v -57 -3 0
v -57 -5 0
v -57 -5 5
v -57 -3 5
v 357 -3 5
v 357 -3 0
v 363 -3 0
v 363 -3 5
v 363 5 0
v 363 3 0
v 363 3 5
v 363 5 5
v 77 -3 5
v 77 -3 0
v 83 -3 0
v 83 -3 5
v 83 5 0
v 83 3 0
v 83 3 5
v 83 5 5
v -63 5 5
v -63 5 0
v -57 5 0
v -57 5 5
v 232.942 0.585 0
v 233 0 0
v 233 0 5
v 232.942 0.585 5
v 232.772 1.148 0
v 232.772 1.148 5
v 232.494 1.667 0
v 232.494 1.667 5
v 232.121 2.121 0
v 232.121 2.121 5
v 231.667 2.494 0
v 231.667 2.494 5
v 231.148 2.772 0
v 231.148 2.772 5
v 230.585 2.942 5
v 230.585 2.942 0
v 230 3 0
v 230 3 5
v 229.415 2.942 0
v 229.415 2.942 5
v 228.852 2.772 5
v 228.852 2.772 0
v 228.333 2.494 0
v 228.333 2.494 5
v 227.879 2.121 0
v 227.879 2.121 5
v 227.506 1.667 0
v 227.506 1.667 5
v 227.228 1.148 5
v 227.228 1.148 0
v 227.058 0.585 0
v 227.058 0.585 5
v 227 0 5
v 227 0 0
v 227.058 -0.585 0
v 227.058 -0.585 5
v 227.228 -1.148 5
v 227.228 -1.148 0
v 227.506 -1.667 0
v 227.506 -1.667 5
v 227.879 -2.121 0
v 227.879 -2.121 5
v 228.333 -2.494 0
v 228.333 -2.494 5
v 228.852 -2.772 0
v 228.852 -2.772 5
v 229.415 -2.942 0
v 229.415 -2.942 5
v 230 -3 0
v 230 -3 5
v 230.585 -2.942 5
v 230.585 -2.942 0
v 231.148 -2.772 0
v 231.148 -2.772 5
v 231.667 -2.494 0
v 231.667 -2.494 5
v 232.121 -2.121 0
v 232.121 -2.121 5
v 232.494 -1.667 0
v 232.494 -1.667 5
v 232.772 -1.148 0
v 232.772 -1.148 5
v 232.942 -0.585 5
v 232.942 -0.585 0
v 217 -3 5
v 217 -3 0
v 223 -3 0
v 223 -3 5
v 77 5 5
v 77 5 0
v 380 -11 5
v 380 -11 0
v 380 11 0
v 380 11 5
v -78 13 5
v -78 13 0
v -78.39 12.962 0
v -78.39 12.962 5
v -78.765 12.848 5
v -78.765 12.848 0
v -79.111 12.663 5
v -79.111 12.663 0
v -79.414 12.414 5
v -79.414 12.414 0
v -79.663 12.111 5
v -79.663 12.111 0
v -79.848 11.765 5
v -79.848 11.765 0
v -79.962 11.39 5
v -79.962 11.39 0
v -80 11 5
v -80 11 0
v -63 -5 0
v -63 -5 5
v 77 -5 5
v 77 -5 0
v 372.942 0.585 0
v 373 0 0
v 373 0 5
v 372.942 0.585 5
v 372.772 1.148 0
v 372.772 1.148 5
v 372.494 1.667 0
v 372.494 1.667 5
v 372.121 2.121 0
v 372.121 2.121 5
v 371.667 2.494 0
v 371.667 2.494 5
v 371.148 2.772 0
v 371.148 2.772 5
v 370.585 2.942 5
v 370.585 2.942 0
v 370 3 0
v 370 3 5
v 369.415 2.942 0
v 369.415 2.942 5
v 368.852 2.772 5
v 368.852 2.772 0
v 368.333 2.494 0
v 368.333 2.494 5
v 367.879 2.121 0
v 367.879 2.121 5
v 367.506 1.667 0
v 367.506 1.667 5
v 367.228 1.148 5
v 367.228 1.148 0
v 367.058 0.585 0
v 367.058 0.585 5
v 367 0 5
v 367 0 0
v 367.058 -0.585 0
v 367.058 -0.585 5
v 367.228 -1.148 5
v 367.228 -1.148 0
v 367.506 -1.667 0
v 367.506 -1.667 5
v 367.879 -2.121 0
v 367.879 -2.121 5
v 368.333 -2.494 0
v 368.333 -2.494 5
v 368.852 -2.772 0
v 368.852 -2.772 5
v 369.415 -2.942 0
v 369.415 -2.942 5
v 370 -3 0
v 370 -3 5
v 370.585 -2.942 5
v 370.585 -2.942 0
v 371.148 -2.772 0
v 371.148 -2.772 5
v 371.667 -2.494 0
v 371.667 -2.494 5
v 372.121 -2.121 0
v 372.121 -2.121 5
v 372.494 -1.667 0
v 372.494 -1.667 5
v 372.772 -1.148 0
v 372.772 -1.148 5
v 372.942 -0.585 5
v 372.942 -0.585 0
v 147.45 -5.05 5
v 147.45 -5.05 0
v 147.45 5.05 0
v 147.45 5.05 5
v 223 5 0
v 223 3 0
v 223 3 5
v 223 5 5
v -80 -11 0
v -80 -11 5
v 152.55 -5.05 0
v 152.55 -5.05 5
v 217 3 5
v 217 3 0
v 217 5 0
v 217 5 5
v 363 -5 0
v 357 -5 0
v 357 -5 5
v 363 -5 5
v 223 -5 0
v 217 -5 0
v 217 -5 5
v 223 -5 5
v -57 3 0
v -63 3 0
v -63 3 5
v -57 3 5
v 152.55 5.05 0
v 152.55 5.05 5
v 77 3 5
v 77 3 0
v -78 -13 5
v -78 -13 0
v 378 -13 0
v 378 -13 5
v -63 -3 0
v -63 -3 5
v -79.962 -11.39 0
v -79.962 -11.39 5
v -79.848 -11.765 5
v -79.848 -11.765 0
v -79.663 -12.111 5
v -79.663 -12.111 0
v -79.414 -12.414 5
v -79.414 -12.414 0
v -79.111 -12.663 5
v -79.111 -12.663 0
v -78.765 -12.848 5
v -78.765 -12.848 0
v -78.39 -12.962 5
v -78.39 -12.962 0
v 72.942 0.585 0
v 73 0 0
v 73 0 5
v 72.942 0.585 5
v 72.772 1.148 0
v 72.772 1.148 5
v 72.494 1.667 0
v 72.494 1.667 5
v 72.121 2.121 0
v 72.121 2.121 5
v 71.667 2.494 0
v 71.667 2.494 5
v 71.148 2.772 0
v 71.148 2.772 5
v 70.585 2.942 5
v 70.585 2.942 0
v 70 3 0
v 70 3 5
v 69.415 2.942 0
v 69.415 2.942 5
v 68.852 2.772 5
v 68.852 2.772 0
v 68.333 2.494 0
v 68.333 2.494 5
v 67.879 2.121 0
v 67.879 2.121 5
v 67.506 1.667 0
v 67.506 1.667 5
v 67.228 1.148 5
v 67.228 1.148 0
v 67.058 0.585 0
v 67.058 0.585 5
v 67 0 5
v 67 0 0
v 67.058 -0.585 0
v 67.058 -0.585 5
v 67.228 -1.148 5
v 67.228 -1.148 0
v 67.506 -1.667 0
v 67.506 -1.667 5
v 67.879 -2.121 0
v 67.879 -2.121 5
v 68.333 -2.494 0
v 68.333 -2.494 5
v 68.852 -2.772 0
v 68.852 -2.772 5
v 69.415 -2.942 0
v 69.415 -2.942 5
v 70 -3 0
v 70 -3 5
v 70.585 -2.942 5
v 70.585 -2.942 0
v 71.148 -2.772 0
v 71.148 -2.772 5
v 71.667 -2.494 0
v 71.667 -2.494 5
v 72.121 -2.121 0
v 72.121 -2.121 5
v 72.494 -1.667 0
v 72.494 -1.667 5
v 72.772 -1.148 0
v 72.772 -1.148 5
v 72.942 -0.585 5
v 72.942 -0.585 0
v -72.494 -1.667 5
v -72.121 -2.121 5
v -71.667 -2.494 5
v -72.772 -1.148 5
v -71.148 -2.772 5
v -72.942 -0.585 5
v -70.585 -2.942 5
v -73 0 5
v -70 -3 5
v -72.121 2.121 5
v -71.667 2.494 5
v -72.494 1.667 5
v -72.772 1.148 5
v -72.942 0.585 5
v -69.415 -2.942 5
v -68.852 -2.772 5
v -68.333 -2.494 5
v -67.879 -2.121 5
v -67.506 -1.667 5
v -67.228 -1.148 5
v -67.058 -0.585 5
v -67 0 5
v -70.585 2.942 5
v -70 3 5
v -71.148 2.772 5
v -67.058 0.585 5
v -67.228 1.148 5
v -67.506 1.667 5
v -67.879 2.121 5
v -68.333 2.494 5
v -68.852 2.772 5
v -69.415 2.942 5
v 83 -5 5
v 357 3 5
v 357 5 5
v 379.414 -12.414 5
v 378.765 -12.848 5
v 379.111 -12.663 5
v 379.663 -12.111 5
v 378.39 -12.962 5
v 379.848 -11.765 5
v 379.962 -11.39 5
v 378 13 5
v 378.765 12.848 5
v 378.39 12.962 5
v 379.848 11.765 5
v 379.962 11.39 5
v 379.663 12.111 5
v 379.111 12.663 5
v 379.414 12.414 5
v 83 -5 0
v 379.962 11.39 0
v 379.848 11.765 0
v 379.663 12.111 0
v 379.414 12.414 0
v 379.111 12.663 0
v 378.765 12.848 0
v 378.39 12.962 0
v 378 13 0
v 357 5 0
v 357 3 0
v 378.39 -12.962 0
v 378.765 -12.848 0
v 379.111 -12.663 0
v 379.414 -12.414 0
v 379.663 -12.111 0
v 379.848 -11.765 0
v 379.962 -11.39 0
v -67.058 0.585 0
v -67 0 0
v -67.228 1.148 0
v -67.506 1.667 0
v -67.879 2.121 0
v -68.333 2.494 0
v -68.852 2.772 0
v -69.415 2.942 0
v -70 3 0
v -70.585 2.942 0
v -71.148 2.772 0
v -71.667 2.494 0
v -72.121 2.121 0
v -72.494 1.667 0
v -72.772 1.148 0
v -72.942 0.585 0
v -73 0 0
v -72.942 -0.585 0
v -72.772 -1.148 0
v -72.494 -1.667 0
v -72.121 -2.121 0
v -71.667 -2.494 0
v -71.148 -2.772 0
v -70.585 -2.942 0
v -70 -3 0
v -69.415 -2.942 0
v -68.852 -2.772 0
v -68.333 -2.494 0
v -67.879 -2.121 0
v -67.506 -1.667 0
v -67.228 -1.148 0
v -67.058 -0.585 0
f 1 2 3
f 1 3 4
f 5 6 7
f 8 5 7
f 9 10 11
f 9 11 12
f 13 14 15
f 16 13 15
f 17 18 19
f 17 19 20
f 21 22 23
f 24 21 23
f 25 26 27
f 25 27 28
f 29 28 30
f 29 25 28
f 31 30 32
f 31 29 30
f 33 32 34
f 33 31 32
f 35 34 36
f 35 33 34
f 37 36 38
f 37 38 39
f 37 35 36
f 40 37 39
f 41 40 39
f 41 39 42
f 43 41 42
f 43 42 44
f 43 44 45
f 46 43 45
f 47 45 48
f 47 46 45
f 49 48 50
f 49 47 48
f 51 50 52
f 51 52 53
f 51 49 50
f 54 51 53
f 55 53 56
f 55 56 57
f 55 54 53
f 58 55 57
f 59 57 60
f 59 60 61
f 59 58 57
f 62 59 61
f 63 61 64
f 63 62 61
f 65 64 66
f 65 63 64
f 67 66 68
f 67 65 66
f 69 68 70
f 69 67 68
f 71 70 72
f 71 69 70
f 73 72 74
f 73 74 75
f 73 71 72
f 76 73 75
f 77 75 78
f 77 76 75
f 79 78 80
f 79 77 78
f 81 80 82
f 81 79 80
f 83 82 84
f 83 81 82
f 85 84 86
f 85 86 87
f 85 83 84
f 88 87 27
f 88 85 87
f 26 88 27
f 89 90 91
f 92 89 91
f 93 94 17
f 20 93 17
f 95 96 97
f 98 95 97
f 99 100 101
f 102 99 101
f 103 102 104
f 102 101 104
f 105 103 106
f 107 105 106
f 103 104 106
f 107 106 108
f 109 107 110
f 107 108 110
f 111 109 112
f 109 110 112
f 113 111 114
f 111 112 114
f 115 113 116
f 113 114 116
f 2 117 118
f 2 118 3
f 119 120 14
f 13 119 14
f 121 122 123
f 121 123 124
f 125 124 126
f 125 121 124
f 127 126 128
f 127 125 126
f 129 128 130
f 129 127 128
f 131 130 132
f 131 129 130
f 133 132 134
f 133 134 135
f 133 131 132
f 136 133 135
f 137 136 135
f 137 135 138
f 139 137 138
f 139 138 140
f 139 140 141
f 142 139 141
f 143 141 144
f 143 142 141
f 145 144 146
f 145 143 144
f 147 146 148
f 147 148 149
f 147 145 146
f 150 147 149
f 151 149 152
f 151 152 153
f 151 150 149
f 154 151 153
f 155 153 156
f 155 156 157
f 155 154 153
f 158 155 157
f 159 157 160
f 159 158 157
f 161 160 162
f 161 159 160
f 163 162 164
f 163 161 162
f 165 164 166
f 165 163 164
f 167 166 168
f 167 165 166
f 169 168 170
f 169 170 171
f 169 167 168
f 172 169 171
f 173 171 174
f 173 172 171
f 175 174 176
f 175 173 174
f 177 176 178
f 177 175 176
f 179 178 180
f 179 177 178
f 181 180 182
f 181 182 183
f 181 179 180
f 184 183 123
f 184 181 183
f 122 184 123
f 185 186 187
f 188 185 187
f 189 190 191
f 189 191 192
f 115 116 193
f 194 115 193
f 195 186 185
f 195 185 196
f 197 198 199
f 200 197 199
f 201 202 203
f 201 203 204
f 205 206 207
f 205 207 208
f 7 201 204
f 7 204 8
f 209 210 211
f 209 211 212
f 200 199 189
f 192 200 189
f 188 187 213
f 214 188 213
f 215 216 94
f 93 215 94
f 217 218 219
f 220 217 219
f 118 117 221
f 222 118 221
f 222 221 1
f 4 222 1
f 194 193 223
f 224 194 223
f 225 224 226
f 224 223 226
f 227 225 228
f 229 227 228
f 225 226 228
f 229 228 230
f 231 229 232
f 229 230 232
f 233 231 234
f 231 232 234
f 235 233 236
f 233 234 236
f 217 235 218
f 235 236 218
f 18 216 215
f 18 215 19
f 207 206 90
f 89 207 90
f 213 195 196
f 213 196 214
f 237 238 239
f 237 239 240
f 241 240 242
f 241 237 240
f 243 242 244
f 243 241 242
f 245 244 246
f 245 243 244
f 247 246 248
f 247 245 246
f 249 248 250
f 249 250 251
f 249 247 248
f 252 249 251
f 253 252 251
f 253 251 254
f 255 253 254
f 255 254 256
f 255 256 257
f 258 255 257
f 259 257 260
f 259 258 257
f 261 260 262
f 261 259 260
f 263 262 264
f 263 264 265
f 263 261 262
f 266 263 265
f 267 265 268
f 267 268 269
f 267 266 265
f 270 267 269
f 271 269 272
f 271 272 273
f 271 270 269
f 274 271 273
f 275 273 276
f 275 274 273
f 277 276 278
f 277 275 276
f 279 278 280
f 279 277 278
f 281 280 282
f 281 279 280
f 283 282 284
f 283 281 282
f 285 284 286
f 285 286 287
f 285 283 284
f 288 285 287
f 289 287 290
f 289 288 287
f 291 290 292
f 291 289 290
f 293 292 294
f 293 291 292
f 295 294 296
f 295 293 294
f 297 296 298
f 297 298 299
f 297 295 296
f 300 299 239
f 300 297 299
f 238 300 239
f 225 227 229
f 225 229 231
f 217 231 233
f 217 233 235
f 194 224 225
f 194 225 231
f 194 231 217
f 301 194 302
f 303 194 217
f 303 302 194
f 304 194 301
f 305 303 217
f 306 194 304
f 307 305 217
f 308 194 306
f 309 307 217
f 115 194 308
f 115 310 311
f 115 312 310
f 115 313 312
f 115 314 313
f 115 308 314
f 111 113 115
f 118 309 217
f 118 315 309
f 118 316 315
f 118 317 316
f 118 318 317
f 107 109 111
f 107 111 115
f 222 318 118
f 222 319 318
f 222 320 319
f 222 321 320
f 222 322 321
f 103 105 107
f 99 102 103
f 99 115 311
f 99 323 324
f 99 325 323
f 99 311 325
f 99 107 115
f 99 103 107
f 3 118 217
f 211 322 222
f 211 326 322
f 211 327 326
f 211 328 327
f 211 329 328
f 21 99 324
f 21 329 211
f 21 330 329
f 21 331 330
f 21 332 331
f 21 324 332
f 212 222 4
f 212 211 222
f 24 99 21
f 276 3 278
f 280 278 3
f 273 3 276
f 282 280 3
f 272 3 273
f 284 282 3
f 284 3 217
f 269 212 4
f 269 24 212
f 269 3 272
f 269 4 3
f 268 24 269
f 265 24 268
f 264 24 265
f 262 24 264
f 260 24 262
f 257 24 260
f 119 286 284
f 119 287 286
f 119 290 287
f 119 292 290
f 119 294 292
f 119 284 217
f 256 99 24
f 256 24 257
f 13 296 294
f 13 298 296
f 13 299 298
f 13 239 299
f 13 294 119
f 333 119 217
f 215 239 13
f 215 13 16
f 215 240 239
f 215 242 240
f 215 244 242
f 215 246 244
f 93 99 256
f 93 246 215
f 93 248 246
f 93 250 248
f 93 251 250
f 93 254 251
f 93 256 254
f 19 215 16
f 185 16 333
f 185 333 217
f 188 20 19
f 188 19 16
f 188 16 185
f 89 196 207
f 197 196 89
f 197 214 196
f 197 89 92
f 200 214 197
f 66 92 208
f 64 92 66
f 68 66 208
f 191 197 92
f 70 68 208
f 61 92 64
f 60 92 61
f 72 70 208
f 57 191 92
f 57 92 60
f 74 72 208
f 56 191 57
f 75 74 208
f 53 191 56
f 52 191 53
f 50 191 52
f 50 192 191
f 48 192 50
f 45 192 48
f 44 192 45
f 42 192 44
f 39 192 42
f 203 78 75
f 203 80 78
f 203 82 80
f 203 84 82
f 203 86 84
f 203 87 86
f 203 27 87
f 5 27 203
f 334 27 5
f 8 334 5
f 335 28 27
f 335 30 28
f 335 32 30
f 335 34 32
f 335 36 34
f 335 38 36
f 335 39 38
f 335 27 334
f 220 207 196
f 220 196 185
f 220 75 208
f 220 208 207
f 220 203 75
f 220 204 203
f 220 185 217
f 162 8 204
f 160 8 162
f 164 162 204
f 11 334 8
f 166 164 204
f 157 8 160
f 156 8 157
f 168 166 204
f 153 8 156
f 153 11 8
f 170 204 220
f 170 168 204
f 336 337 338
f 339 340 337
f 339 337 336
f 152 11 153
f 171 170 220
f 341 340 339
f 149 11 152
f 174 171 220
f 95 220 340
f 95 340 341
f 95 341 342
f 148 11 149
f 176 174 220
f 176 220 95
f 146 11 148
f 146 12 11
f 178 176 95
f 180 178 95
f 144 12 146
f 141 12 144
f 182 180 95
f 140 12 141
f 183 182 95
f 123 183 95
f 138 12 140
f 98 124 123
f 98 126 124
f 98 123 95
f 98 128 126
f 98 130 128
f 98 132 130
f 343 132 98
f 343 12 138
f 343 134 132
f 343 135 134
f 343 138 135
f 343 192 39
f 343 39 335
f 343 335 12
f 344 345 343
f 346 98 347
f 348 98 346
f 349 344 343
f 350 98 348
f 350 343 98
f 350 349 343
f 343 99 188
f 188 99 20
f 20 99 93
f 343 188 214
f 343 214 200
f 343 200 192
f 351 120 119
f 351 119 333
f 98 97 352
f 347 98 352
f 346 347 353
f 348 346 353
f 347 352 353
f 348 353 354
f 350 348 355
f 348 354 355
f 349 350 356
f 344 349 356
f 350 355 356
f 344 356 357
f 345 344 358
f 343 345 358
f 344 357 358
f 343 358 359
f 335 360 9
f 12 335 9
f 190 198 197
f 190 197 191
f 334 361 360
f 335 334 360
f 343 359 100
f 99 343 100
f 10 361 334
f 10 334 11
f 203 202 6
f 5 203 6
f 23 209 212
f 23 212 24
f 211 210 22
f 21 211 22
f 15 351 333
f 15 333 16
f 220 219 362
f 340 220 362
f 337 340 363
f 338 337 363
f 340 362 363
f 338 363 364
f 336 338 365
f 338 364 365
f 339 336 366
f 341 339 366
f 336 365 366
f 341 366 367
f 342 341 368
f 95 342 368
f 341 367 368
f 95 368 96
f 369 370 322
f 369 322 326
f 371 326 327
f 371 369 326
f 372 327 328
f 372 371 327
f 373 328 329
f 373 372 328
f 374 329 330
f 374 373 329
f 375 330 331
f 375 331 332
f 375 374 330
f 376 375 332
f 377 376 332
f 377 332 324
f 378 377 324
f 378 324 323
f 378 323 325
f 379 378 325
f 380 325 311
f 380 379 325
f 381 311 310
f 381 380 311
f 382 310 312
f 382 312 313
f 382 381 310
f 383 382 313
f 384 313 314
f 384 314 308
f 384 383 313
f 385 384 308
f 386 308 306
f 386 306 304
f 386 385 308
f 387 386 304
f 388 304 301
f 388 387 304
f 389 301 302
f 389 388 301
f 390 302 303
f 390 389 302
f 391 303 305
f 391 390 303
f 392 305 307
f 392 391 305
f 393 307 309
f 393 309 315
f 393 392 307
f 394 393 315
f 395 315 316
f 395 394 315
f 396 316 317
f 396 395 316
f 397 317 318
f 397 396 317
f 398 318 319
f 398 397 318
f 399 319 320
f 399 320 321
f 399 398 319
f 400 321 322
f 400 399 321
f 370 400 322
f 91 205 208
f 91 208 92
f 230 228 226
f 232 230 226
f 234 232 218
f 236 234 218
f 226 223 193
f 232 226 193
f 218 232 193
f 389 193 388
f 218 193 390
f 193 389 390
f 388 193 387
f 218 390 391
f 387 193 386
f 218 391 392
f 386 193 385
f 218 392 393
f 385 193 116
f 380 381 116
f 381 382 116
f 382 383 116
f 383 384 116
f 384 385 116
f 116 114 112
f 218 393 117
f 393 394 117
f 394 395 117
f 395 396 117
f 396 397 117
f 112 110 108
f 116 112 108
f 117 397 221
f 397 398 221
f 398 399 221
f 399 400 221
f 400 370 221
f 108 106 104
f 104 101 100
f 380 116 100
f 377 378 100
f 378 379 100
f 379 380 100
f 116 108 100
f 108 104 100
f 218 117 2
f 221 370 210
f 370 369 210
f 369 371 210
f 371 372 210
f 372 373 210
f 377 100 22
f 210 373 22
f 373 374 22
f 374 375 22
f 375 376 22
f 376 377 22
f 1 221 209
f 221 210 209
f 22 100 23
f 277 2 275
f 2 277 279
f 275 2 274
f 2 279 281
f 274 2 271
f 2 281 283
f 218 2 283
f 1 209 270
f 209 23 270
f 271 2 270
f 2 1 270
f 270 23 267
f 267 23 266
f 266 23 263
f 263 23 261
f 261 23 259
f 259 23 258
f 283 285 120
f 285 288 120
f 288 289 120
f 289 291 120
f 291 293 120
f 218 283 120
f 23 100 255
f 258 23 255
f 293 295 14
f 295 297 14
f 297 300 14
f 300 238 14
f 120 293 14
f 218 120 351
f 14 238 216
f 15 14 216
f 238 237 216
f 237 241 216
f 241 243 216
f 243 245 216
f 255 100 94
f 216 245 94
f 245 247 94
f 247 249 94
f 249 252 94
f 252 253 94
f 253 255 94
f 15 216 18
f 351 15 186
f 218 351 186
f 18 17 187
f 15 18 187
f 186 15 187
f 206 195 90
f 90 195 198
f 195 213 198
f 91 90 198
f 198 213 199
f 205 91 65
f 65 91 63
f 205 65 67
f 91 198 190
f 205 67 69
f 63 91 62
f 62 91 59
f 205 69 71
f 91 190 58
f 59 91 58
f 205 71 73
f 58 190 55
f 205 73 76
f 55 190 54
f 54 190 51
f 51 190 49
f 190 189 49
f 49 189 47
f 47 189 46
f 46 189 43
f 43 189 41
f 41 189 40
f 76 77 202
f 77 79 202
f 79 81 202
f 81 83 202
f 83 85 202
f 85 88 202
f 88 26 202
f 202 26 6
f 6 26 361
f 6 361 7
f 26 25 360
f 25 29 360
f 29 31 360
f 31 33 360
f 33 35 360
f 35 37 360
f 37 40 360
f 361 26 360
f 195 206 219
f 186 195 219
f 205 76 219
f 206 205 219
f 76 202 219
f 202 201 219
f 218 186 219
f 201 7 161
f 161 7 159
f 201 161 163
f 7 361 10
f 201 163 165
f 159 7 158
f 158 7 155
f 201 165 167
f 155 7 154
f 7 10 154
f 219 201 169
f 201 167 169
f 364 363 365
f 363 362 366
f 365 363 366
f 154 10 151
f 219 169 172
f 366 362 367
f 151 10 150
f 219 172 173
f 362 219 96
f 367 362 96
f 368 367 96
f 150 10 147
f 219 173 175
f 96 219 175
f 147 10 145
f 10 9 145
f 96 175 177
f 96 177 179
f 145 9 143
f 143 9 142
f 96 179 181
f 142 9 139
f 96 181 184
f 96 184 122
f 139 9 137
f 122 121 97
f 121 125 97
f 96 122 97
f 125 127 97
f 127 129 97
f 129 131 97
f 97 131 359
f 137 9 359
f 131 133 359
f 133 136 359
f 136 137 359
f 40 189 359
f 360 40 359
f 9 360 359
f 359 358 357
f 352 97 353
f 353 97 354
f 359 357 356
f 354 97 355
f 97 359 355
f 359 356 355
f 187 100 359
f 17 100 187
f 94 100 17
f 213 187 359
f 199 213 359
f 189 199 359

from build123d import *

# Parameters (mm, degrees)
F0_W     = 6
F0_H     = 2
F0_R     = 3
F0_W_2   = 5.1
F0_H_2   = 10.1
F1_DEPTH = 5


with BuildPart() as f1:
    # F0 (on Top) → F1 (new body)
    with BuildSketch(Plane.XY):
        with BuildLine():
            ThreePointArc((-80, -11), (-79.414214, -12.414214), (-78, -13))
            Line((-78, -13), (378, -13))
            ThreePointArc((378, -13), (379.414214, -12.414214), (380, -11))
            Line((380, -11), (380, 11))
            ThreePointArc((380, 11), (379.414214, 12.414214), (378, 13))
            Line((378, 13), (-78, 13))
            ThreePointArc((-78, 13), (-79.414214, 12.414214), (-80, 11))
            Line((-80, 11), (-80, -11))
        make_face()
        with Locations((-60, -4)):
            Rectangle(F0_W, F0_H, mode=Mode.SUBTRACT)
        with Locations((-70, 0)):
            Circle(F0_R, mode=Mode.SUBTRACT)
        with Locations((80, -4)):
            Rectangle(F0_W, F0_H, mode=Mode.SUBTRACT)
        with Locations((70, 0)):
            Circle(F0_R, mode=Mode.SUBTRACT)
        with Locations((220, -4)):
            Rectangle(F0_W, F0_H, mode=Mode.SUBTRACT)
        with Locations((150, 0)):
            Rectangle(F0_W_2, F0_H_2, mode=Mode.SUBTRACT)
        with Locations((230, 0)):
            Circle(F0_R, mode=Mode.SUBTRACT)
        with Locations((360, -4)):
            Rectangle(F0_W, F0_H, mode=Mode.SUBTRACT)
        with Locations((370, 0)):
            Circle(F0_R, mode=Mode.SUBTRACT)
        with Locations((-60, 4)):
            Rectangle(F0_W, F0_H, mode=Mode.SUBTRACT)
        with Locations((80, 4)):
            Rectangle(F0_W, F0_H, mode=Mode.SUBTRACT)
        with Locations((220, 4)):
            Rectangle(F0_W, F0_H, mode=Mode.SUBTRACT)
        with Locations((360, 4)):
            Rectangle(F0_W, F0_H, mode=Mode.SUBTRACT)
    extrude(amount=F1_DEPTH)


solid = f1.part
